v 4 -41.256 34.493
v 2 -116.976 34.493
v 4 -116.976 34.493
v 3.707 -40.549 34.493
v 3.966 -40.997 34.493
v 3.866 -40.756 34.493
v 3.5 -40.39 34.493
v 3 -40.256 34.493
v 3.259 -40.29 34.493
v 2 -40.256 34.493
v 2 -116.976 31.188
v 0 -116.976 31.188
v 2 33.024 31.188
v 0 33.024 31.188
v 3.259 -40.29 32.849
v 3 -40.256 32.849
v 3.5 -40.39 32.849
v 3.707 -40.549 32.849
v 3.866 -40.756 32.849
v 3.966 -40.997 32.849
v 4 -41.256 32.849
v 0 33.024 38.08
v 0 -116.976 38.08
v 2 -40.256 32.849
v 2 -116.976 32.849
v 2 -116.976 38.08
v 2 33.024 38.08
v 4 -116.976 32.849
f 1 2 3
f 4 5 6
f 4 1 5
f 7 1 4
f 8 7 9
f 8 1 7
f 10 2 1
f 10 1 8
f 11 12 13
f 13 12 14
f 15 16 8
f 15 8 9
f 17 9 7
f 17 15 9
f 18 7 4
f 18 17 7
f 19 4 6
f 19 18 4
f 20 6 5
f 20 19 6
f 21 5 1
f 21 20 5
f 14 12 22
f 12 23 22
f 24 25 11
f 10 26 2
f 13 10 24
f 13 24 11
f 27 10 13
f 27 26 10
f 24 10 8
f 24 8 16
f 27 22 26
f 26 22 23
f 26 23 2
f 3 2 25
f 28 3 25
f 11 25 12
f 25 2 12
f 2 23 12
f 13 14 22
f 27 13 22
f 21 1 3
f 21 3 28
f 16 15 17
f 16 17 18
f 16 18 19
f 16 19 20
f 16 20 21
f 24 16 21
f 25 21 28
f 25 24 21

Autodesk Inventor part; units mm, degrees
ref_plane "YZ Plane" through (0, 0, 0) normal (1, 0, 0) x (0, 1, 0)
ref_plane "XZ Plane" through (0, 0, 0) normal (0, 1, 0) x (-1, 0, 0)
ref_plane "XY Plane" through (0, 0, 0) normal (0, 0, 1) x (1, 0, 0)
sketch "Sketch1" plane through (0, 0, 0) normal (1, 0, 0) x (0, 1, 0)
  line L0 (33.0238, 38.0801) -> (-116.9762, 38.0801)
  line L1 (-116.9762, 38.0801) -> (-116.9762, 31.188)
  line L2 (-116.9762, 31.188) -> (33.0238, 31.188)
  line L3 (33.0238, 31.188) -> (33.0238, 38.0801)
  point P0 (0, 0)
  dimension "d0" = 150
extrude "Extrusion1" add sketch "Sketch1" along normal blind 2
sketch "Sketch2" plane through (2, 0, 0) normal (1, 0, 0) x (0, 0, -1)
  line L0 (-38.0801, -116.9762) -> (-31.188, -116.9762) projected
  line L1 (-34.4927, -40.2559) -> (-32.849, -40.2559)
  line L2 (-32.849, -40.2559) -> (-32.849, -116.9762)
  line L3 (-32.849, -116.9762) -> (-34.4927, -116.9762)
  line L4 (-34.4927, -116.9762) -> (-34.4927, -40.2559)
  point P0 (0, 0)
extrude "Extrusion2" add sketch "Sketch2" along normal blind 2
fillet "Fillet1" radius 1 1 edges at (4, -40.2559, 33.6708)
properties part number "lock4"
